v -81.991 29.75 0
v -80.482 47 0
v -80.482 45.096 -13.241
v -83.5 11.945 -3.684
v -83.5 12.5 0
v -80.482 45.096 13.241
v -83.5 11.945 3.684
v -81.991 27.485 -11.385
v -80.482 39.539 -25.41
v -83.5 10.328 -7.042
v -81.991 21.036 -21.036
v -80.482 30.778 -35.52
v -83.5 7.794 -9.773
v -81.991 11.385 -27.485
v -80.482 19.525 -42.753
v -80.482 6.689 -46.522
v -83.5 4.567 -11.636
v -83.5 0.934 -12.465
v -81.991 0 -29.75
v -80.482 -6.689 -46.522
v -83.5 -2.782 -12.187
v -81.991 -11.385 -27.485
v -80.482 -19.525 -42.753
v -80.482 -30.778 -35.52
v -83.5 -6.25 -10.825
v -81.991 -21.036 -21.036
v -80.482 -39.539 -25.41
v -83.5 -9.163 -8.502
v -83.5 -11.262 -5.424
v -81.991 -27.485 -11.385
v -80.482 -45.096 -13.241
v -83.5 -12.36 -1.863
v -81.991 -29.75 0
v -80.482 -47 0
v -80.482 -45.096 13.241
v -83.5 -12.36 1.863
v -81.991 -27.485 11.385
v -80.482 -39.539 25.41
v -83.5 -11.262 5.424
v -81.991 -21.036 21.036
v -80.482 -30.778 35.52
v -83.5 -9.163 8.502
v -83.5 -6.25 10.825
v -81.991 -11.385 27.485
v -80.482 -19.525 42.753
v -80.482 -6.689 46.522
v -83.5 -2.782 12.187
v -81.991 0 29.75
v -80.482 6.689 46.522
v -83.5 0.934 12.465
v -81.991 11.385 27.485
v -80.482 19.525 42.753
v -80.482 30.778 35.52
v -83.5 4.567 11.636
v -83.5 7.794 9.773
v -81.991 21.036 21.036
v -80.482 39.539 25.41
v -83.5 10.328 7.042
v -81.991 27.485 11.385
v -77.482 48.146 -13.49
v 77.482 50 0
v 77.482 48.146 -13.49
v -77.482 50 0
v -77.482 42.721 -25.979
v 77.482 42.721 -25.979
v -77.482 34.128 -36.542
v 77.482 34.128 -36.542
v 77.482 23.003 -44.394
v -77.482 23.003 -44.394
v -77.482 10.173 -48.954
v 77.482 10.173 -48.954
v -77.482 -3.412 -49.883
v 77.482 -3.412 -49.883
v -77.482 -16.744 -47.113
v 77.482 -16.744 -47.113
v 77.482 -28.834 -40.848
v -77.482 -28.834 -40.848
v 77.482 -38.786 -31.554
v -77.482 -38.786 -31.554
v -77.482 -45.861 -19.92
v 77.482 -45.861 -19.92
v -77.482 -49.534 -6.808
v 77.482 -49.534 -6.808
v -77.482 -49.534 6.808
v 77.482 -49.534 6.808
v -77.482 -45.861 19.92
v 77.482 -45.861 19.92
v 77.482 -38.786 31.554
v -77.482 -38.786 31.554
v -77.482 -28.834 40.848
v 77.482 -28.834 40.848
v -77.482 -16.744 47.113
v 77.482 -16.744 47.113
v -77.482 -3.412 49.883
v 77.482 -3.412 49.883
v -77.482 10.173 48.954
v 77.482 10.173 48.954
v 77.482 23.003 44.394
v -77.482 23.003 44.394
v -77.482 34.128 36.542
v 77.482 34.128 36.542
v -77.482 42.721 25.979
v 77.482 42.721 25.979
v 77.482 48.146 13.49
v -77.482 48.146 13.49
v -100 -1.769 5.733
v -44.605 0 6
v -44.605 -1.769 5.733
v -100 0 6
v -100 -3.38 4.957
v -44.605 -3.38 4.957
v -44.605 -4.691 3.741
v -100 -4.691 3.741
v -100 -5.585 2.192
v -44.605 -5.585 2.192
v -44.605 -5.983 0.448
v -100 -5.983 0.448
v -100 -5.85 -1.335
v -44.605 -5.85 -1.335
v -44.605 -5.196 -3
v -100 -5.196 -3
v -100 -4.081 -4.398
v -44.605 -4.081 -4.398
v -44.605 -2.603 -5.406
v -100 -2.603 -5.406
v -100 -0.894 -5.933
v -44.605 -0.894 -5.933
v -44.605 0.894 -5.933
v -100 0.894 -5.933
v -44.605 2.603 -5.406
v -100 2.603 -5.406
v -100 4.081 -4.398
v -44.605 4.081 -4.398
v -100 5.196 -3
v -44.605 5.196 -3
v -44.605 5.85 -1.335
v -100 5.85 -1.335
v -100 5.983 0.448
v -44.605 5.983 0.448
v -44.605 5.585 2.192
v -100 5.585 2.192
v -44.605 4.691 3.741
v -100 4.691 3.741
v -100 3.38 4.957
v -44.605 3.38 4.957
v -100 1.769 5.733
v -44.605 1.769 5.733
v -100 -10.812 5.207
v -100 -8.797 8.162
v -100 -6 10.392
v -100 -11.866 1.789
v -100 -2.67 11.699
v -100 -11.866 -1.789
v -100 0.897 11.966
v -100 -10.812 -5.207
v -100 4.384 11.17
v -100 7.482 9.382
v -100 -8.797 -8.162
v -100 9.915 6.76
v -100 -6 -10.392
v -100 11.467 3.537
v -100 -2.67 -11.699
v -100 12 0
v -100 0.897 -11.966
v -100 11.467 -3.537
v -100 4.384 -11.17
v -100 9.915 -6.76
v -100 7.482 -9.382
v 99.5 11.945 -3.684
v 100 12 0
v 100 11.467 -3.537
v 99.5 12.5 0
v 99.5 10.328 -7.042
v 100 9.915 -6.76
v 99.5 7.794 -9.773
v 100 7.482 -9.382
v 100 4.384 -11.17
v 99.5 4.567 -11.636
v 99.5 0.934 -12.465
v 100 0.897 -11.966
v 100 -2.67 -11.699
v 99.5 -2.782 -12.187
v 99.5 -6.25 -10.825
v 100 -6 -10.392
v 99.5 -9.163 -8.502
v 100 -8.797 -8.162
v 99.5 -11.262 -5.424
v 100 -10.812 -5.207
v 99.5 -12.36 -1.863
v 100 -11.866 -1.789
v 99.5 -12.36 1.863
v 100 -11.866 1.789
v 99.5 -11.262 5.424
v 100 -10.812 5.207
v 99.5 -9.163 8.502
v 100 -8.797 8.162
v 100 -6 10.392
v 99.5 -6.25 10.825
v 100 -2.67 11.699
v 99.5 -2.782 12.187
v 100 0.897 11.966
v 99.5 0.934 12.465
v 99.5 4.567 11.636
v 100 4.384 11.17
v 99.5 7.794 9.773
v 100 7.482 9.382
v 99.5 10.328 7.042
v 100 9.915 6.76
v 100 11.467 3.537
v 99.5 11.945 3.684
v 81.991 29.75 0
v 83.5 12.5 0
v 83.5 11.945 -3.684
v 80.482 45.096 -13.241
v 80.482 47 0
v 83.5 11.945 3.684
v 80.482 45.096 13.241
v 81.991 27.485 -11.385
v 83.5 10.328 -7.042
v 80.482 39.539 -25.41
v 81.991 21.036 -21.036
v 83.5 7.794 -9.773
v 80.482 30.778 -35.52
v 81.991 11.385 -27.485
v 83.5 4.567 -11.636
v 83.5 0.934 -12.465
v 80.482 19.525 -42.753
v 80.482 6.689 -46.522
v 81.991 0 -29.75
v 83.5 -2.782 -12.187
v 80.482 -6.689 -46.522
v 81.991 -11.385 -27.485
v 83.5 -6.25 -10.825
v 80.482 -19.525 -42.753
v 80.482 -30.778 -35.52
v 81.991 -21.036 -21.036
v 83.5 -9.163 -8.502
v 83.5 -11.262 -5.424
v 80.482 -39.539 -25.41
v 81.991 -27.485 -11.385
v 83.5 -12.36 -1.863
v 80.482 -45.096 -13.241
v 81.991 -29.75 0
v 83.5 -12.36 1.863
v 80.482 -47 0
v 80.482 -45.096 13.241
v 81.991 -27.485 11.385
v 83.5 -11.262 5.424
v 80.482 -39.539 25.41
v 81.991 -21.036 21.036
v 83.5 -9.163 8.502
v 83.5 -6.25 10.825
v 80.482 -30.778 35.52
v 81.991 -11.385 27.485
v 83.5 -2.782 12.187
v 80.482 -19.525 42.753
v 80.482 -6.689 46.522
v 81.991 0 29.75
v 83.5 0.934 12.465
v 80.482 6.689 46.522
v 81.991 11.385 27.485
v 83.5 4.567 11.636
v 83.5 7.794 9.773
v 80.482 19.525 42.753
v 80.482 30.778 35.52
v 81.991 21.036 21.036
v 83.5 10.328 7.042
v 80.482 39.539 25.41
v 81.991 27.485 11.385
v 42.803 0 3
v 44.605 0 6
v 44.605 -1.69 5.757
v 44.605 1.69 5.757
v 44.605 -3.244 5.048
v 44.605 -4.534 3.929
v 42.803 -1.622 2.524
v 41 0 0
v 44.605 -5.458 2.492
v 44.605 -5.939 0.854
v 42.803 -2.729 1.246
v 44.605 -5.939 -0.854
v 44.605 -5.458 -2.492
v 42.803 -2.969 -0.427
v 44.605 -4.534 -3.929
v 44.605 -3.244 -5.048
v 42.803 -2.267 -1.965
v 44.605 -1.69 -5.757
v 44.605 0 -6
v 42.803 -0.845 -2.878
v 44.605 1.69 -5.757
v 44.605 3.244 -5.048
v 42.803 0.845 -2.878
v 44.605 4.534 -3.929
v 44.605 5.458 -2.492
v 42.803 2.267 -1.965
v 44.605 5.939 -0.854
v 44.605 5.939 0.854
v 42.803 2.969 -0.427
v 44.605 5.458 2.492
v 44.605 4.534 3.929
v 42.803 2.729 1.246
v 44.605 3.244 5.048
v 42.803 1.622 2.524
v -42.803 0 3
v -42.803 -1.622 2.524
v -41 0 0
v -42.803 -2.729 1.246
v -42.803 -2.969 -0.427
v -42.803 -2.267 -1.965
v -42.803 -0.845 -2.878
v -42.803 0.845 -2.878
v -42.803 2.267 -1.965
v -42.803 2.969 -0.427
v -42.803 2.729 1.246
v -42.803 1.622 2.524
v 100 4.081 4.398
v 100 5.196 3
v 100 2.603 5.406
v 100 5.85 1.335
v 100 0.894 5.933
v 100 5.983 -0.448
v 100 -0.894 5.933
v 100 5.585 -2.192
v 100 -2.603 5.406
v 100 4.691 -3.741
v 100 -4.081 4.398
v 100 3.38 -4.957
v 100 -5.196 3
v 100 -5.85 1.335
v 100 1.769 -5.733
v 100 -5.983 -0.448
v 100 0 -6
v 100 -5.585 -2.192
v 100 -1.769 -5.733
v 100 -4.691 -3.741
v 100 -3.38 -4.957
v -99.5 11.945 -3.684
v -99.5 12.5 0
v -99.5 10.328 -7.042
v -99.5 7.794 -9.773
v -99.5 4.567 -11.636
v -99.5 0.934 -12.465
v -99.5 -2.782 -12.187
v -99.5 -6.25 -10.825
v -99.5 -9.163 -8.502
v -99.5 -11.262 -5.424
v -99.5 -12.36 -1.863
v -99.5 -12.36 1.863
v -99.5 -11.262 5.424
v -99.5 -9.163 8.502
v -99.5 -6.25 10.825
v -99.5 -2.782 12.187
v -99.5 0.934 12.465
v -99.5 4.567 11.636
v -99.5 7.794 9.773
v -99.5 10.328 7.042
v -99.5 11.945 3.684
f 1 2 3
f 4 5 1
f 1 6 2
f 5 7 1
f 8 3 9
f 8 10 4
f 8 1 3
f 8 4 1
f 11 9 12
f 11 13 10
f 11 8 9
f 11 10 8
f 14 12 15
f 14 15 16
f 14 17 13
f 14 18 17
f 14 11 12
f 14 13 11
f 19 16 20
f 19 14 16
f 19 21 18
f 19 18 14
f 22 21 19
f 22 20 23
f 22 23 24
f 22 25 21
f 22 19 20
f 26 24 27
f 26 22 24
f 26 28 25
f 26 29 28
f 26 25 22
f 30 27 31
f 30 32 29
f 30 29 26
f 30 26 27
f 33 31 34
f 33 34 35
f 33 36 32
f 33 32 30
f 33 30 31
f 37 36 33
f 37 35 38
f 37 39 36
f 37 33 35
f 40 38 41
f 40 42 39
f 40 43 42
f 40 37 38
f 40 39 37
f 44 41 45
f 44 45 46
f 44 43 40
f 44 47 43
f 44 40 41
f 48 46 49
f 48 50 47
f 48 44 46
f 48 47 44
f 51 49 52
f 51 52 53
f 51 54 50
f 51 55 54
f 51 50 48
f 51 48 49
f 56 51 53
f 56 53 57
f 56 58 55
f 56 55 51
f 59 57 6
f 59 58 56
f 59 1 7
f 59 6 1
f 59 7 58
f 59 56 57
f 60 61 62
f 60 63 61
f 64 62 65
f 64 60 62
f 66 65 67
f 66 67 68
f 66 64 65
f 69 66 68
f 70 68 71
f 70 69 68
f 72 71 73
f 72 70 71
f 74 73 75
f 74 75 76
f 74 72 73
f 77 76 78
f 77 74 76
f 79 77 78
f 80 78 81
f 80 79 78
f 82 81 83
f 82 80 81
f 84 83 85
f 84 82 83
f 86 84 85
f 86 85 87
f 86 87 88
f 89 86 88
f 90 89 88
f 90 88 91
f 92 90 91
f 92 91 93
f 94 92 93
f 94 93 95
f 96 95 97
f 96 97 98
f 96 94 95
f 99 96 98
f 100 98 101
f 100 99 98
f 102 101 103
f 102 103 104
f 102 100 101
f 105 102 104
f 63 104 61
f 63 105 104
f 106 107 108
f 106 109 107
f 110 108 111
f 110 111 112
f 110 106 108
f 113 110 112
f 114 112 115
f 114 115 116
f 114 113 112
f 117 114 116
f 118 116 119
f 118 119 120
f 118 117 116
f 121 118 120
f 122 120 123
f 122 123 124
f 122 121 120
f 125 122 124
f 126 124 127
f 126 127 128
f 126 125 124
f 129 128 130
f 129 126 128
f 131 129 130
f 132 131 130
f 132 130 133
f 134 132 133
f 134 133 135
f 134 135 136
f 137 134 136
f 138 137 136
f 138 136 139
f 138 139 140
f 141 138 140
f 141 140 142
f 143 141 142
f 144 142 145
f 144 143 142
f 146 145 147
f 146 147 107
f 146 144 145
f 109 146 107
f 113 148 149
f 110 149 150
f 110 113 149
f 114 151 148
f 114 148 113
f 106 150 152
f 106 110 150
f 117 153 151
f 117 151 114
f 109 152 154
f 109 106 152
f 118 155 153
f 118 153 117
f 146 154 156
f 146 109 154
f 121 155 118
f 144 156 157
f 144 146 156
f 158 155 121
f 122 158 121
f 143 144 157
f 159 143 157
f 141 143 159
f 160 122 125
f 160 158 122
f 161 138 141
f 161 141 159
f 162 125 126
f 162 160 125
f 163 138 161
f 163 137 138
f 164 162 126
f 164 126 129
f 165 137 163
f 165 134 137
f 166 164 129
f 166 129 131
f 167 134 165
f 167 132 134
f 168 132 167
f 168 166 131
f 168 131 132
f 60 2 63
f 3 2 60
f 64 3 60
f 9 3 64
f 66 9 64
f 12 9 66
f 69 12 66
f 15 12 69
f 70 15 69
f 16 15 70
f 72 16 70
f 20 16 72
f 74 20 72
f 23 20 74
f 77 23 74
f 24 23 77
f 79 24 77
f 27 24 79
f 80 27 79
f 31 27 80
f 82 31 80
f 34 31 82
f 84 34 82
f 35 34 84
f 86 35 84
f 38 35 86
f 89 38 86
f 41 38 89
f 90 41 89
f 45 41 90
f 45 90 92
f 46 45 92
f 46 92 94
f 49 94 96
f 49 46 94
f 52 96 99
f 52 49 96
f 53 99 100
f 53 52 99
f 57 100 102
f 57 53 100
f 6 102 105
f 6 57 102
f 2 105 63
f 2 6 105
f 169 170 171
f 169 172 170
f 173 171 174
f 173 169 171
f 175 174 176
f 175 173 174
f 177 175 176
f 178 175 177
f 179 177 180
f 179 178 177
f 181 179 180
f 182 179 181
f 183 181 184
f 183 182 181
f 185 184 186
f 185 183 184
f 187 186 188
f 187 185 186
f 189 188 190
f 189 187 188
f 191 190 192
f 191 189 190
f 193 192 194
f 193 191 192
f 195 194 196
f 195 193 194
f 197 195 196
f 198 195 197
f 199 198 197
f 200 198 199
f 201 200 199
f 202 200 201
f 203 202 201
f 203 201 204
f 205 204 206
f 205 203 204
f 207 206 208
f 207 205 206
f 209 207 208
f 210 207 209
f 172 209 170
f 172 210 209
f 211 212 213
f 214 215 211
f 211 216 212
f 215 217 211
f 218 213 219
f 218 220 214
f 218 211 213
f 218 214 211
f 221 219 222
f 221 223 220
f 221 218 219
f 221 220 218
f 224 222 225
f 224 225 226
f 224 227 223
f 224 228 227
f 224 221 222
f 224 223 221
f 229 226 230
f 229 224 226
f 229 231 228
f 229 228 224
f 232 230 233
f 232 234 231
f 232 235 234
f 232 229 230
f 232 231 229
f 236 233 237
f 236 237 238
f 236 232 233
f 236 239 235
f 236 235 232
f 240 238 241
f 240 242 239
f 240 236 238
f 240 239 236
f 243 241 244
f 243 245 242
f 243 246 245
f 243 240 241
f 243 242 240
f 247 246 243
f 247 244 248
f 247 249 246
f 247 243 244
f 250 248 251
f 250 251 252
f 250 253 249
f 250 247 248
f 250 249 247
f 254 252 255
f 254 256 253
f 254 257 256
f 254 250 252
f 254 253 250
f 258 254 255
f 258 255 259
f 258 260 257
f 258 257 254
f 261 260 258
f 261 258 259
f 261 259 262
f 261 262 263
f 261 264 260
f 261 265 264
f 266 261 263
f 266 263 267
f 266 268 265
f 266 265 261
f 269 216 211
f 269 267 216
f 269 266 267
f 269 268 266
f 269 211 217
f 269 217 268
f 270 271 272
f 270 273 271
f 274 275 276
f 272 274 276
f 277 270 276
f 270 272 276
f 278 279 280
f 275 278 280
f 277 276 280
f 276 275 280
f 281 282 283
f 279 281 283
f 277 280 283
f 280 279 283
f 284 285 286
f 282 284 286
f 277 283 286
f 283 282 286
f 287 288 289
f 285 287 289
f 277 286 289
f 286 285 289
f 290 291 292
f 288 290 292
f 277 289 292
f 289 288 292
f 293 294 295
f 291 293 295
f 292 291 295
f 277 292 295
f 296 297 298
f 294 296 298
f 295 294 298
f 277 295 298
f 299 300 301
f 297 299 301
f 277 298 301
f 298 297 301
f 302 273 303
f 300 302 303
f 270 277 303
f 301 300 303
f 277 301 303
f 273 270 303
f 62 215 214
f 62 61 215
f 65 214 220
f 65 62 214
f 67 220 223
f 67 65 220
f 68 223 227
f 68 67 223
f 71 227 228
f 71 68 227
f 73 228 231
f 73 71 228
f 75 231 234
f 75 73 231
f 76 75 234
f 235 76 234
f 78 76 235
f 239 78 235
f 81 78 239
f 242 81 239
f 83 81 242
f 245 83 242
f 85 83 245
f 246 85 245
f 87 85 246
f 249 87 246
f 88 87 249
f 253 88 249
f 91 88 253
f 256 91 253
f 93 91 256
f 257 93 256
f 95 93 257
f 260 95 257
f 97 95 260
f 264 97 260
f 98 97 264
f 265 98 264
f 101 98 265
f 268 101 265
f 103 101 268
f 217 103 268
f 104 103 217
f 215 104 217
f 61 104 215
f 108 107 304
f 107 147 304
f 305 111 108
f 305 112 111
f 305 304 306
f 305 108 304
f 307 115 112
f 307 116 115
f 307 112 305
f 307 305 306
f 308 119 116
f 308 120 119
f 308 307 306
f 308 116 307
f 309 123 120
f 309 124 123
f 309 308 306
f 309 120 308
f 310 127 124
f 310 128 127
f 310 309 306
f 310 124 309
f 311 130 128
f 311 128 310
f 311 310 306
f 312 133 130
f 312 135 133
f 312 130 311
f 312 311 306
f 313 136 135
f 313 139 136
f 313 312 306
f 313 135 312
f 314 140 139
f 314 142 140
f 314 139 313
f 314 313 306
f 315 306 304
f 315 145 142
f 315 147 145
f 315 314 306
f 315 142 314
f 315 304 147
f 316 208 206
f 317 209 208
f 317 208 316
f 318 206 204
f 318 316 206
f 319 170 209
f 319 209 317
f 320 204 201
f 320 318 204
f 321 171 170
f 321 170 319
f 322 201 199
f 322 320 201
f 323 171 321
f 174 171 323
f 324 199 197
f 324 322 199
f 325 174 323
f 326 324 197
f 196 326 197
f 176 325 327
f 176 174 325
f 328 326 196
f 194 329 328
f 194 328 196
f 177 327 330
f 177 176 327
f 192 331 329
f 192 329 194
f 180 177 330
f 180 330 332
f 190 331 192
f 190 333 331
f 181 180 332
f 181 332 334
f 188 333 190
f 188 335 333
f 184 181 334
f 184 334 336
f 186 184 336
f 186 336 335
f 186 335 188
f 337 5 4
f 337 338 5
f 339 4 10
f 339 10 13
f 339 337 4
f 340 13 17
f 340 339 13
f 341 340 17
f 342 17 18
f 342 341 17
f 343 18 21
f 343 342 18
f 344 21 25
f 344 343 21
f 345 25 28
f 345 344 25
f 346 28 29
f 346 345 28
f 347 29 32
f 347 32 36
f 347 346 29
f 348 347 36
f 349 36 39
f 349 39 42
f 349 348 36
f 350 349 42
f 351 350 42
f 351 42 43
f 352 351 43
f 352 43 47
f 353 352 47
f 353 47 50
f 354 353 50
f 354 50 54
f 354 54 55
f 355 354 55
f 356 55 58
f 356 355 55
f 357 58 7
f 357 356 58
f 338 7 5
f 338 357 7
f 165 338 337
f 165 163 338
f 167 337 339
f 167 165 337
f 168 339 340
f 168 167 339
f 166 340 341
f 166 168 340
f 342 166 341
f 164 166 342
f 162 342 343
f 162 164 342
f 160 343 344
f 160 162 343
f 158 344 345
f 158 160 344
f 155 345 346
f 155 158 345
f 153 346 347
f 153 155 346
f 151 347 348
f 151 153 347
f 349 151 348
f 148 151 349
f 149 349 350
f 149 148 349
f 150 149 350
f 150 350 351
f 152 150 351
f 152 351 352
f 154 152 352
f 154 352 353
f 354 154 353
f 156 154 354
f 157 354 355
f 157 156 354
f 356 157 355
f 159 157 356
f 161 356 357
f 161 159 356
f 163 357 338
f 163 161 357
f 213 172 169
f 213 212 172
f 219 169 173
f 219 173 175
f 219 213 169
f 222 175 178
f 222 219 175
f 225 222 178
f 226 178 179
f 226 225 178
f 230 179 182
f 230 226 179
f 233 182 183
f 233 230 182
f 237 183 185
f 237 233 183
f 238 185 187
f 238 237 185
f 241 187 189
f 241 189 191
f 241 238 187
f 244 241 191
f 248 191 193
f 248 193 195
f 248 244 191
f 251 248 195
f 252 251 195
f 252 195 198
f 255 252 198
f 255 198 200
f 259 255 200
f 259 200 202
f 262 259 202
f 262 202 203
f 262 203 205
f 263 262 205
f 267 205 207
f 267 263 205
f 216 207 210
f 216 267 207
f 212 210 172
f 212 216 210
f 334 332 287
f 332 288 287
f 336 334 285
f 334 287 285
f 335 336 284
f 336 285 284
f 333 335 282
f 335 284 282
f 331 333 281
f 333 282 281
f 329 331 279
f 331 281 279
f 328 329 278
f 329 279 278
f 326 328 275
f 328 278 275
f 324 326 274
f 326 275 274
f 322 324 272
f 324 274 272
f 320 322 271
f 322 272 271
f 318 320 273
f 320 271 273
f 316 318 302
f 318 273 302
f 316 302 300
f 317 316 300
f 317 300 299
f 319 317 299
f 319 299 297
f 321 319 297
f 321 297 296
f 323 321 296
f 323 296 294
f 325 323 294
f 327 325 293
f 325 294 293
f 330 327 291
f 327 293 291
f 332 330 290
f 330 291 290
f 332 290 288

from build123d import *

# Parameters (mm, degrees)
TALADRO_DE_MARGEN_PARA_M102_D     = 12
TALADRO_DE_MARGEN_PARA_M102_DEPTH = 55.394836286
TALADRO_DE_MARGEN_PARA_M102_TIP   = 3.605163714


with BuildPart() as part:
    # Croquis1 → Revolución1 (revolve)
    with BuildSketch(Plane.XY):
        Polygon((100, 0), (100, 12), (99.5, 12.5), (83.5, 12.5), (80.481641108, 47), (77.481641108, 50), (-77.481641108, 50), (-80.481641108, 47), (-83.5, 12.5), (-99.5, 12.5), (-100, 12), (-100, 0), align=None)
    revolve(axis=Axis((112.244897959, 0, 0), (-1, 0, 0)))

    # Croquis8 → Taladro de margen para M101 (revolve, cut)
    with BuildSketch(Plane(origin=(-100, 0, 0), x_dir=(0, 0, 1), z_dir=(0, 1, 0))):
        Polygon((0, 0), (0, 59), (6, 55.394836286), (6, 0), align=None)
    revolve(axis=Axis((-106.35, 0, 0), (1, 0, 0)), mode=Mode.SUBTRACT)

    # Taladro de margen para M102
    with Locations(Plane(origin=(100, 0, 0), x_dir=(0, 0, 1), z_dir=(1, 0, 0))):
        with Locations((0, 0)):
            Hole(TALADRO_DE_MARGEN_PARA_M102_D / 2, depth=TALADRO_DE_MARGEN_PARA_M102_DEPTH)
            with Locations((0, 0, -(TALADRO_DE_MARGEN_PARA_M102_DEPTH + TALADRO_DE_MARGEN_PARA_M102_TIP / 2))):  # 118° drill point
                Cone(0, TALADRO_DE_MARGEN_PARA_M102_D / 2, TALADRO_DE_MARGEN_PARA_M102_TIP, mode=Mode.SUBTRACT)


solid = part.part
